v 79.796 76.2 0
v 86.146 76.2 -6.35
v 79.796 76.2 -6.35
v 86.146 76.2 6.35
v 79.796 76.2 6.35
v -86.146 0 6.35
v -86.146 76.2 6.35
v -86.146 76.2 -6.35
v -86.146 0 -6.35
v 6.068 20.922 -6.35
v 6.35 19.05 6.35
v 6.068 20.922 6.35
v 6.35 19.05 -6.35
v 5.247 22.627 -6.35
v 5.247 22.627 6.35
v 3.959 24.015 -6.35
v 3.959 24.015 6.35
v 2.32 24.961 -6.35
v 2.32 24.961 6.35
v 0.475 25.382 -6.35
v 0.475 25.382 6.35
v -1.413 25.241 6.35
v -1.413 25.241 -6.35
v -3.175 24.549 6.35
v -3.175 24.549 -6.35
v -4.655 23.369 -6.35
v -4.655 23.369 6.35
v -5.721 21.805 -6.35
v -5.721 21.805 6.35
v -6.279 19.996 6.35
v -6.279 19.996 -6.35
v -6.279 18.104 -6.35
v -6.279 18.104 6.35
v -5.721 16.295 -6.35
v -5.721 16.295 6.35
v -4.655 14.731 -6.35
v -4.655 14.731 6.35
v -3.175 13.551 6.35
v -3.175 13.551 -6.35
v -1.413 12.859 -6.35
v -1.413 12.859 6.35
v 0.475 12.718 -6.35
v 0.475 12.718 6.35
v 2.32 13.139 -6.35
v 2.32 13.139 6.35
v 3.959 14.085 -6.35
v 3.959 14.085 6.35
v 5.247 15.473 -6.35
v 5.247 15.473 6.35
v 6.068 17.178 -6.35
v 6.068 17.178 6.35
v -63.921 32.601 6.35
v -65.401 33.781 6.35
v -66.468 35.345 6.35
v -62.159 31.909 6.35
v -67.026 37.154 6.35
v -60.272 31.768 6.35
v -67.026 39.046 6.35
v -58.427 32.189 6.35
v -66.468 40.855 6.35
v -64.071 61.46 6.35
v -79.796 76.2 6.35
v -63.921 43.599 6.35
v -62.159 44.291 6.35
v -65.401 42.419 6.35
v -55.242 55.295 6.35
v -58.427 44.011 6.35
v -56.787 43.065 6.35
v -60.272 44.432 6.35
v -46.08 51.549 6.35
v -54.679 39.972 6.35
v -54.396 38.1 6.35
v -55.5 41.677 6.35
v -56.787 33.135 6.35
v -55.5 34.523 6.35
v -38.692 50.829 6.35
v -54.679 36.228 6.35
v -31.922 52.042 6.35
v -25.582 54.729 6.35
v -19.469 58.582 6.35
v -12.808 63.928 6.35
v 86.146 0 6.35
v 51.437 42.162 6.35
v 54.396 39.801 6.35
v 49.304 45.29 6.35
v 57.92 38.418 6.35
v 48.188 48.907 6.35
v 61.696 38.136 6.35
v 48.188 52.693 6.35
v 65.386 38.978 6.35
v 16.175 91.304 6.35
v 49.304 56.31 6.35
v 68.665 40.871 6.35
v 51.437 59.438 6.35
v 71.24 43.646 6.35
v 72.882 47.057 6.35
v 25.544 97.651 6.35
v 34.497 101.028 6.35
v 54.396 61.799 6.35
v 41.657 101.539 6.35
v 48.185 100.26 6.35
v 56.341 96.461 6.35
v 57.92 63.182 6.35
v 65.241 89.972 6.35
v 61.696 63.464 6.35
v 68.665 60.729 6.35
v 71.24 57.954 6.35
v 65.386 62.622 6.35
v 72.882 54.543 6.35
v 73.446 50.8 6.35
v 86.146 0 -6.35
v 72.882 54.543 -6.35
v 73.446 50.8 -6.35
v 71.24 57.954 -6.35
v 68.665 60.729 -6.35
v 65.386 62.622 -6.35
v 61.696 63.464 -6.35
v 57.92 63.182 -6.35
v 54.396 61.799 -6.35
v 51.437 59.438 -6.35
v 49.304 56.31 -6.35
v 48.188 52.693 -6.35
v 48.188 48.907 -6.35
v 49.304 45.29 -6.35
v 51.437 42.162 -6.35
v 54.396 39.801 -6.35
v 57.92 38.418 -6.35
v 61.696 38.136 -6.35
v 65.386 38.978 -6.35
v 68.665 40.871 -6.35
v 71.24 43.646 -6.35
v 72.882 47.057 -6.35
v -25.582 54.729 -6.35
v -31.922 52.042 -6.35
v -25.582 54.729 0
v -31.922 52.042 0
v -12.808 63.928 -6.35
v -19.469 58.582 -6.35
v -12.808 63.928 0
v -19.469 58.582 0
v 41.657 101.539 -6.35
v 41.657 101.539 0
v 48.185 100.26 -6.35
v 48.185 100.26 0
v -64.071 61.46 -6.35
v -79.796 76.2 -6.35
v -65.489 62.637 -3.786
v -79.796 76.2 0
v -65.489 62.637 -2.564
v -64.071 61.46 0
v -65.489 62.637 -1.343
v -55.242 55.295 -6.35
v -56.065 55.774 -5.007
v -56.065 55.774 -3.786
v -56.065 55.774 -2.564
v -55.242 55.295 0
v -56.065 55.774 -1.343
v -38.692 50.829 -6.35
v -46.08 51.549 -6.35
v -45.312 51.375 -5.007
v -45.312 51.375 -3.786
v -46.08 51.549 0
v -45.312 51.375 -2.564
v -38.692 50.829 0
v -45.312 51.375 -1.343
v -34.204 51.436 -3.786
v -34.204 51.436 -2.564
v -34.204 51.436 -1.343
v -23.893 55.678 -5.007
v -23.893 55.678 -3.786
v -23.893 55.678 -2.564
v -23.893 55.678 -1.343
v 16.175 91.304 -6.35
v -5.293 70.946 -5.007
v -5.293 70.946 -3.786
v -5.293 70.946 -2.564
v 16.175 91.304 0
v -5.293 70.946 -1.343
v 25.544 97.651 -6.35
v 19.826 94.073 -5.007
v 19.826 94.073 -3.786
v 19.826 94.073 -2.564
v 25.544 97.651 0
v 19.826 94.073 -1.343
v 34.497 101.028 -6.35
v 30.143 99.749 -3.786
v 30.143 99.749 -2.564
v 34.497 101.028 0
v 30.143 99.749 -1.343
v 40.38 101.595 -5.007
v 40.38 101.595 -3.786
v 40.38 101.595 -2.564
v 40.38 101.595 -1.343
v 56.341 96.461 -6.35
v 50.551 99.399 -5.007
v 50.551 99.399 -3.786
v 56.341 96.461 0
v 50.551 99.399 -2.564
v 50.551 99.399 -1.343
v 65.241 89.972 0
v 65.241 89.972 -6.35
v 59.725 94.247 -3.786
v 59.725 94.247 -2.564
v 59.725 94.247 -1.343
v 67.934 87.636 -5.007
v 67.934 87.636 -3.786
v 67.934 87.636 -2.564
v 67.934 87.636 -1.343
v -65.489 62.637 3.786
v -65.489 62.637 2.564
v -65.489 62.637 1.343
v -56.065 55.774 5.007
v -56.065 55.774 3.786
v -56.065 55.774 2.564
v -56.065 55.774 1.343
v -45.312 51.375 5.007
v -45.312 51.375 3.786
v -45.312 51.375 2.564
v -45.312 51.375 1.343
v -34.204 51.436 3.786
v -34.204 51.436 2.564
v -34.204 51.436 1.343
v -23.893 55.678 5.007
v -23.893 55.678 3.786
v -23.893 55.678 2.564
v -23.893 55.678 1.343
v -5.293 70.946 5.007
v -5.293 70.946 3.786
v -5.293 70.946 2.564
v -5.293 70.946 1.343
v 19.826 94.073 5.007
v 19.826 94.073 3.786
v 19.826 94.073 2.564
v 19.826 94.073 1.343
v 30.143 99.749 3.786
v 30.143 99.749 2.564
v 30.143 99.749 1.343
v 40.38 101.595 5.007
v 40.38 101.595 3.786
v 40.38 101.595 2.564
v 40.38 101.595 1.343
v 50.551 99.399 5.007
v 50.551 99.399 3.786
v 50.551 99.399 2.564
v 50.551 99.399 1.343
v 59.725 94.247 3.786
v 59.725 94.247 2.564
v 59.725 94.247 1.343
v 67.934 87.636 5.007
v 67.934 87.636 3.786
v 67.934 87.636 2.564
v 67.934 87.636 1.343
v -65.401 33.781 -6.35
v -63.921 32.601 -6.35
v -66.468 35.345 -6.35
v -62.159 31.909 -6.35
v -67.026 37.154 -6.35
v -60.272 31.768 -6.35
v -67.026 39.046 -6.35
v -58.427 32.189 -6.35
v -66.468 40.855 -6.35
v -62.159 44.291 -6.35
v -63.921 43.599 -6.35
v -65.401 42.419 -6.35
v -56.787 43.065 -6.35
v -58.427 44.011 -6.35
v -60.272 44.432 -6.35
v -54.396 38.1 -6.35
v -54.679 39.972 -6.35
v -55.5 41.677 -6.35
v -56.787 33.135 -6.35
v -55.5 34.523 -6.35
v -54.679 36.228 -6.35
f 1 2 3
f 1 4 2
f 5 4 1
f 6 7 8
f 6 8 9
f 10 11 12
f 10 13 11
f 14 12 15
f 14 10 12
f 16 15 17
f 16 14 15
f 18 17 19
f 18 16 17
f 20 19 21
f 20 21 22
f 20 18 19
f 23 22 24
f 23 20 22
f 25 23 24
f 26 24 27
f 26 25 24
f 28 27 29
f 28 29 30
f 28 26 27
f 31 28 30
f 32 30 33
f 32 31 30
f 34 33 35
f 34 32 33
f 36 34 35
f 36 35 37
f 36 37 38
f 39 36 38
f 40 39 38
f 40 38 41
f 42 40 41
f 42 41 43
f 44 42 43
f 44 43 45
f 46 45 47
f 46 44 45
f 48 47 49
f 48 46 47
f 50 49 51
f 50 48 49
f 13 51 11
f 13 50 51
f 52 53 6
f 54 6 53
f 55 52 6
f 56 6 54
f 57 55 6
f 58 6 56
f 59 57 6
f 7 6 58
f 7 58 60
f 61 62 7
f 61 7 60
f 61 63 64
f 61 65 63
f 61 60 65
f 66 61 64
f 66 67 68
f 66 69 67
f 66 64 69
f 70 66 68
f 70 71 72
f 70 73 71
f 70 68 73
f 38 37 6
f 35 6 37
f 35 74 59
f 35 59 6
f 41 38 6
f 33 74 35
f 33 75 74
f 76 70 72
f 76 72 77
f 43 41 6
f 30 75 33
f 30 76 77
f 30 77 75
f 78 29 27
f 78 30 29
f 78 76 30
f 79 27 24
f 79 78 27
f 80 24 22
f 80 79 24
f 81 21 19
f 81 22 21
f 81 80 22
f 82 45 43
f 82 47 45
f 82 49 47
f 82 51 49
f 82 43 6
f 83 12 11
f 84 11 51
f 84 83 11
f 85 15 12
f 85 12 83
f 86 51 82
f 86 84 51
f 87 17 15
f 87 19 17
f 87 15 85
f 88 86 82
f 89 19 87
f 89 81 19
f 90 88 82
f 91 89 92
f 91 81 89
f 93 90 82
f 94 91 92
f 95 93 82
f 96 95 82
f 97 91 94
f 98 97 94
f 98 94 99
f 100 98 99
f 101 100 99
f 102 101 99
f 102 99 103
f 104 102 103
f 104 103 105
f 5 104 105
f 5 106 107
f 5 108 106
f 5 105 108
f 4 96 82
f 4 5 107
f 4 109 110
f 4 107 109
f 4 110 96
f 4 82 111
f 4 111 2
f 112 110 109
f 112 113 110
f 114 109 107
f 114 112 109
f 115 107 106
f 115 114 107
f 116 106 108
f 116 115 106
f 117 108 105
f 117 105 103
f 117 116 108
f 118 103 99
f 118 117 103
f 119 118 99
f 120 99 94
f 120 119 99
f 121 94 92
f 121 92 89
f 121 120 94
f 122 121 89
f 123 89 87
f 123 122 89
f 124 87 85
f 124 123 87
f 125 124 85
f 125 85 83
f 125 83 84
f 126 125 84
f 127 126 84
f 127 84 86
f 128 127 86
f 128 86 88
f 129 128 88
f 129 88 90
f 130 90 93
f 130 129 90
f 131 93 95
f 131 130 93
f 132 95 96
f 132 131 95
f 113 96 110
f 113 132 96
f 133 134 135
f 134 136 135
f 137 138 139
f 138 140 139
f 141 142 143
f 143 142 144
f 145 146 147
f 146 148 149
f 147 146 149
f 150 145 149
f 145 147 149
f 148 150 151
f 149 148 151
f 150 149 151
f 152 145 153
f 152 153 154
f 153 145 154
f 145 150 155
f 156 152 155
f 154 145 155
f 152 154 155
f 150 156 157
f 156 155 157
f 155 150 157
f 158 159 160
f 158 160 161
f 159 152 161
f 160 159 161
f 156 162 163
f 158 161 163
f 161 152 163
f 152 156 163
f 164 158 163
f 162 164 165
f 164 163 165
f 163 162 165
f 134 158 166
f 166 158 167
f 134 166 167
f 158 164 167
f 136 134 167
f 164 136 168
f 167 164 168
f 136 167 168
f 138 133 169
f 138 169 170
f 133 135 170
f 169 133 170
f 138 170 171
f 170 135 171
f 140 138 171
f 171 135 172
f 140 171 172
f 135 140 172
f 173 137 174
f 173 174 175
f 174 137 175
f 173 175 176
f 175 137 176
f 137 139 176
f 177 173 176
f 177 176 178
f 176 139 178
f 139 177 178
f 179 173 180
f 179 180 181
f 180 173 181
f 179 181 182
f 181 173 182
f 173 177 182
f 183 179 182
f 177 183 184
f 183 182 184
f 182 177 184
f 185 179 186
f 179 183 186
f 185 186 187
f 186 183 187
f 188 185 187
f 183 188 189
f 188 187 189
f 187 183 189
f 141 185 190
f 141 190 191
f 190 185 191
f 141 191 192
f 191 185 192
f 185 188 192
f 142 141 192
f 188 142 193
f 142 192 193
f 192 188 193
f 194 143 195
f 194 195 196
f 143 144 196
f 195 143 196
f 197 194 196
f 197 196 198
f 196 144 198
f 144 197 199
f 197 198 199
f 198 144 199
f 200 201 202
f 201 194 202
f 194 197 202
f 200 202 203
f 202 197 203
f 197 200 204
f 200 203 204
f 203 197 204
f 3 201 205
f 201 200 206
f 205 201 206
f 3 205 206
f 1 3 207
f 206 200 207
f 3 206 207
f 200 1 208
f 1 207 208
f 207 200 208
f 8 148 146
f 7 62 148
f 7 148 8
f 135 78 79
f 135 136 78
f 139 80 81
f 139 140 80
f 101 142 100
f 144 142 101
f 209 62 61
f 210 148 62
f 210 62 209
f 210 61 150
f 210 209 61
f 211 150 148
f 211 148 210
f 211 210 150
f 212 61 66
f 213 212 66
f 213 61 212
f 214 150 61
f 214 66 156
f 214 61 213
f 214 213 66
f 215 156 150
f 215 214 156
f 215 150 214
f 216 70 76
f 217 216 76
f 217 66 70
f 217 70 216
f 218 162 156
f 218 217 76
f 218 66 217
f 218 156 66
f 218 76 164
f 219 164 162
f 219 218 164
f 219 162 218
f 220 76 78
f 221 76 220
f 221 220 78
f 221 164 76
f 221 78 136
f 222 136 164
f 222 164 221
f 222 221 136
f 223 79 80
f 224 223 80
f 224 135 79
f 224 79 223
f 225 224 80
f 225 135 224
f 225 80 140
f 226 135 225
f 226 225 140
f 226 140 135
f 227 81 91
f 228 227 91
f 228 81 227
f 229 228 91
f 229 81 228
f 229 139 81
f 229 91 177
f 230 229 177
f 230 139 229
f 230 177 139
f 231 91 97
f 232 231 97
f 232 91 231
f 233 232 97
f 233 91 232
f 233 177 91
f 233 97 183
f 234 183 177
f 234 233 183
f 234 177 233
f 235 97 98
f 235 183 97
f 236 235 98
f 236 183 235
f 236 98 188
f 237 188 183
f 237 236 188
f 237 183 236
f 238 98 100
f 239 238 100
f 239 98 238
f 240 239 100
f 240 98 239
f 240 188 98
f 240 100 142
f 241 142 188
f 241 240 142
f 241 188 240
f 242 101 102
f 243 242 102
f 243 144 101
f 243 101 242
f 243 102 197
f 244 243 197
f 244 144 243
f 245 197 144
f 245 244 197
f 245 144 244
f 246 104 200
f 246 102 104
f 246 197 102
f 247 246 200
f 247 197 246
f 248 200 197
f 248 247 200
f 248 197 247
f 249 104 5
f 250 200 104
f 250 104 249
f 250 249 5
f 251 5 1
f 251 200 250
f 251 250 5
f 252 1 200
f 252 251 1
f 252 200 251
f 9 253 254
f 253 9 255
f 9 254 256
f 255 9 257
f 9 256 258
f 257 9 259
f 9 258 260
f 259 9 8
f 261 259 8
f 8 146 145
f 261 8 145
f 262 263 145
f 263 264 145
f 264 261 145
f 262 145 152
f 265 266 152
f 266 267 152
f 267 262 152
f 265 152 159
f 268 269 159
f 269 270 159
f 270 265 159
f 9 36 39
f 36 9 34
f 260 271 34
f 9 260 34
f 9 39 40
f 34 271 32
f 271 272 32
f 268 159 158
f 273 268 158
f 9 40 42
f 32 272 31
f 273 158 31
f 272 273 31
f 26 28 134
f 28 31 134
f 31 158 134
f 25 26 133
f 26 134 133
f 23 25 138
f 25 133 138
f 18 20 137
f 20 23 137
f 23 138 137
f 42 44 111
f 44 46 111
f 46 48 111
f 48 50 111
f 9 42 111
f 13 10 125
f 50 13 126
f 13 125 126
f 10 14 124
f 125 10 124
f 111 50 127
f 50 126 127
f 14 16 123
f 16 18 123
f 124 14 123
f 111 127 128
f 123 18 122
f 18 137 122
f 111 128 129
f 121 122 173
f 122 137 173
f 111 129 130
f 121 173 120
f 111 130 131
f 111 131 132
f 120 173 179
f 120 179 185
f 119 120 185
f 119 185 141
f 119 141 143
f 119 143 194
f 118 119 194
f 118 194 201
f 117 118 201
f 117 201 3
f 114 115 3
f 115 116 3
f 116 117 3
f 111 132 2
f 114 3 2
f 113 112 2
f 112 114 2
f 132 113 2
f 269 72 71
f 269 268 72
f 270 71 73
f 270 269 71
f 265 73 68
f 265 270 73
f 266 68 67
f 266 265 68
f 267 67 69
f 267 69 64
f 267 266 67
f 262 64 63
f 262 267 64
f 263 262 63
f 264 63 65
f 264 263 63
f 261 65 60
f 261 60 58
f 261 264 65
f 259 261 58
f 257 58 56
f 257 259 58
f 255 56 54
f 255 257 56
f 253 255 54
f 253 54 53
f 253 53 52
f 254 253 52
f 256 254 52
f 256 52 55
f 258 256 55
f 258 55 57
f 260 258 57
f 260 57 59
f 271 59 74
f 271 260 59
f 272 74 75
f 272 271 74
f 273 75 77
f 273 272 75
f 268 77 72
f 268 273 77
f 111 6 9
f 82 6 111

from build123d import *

# Parameters (mm, degrees)
SKETCH1_R           = 6.35
SKETCH1_R_2         = 12.7
BOSS_EXTRUDE1_DEPTH = 6.35


with BuildPart() as part:
    # Sketch1 → Boss-Extrude1 (new body, symmetric)
    with BuildSketch(Plane.XY):
        with BuildLine():
            Line((-79.796453401, 76.2), (-86.146453401, 76.2))
            Line((-86.146453401, 76.2), (-86.146453401, 0))
            Line((-86.146453401, 0), (86.146453401, 0))
            Line((86.146453401, 0), (86.146453401, 76.2))
            Line((86.146453401, 76.2), (79.796453401, 76.2))
            add(Edge.make_bspline(
                [(-79.796453401, 76.2), (-79.189310673, 75.592857272), (-78.419838536, 74.823385314), (-76.839857821, 73.246390226), (-75.851003836, 72.270543834), (-75.034699193, 71.465022368), (-74.31136546, 70.756453846), (-73.576023602, 70.040507975), (-72.649051158, 69.144399927), (-71.532310925, 68.076646001), (-70.219545888, 66.841538959), (-68.485500153, 65.247913117), (-66.807716386, 63.756647213), (-65.185312119, 62.36911953), (-63.618958787, 61.086526883), (-62.34769091, 60.083038976), (-60.733687689, 58.860738712), (-58.999907039, 57.626741231), (-57.13486754, 56.400446885), (-54.689758355, 54.949353195), (-51.661408432, 53.383106741), (-47.681394209, 51.79858192), (-42.756225748, 50.724835978), (-37.483967518, 50.69738214), (-31.963227666, 51.800126692), (-26.958939092, 53.839759909), (-22.374127361, 56.485511101), (-17.5554774, 59.905980771), (-12.89982765, 63.745892876), (-7.93842501, 68.317451576), (-2.627479816, 73.554045081), (2.627480982, 78.845954257), (7.938421068, 84.082550661), (12.899835071, 88.654102914), (17.555465978, 92.49402571), (22.374144001, 95.914479457), (26.958910268, 98.560256445), (31.963269254, 100.599849723), (37.483906393, 101.702652489), (42.756336754, 101.675101345), (47.681204664, 100.601524117), (52.135278168, 98.828187823), (55.851003112, 96.824403503), (58.927126504, 94.848359807), (61.716390424, 92.827512958), (64.26102906, 90.813749271), (66.893187543, 88.584227753), (69.259901401, 86.454968432), (71.335322871, 84.51629968), (73.226893933, 82.7004825), (74.640561752, 81.324965424), (76.227601829, 79.75884352), (77.4656073, 78.52965168), (78.875222889, 77.121230608), (79.492882037, 76.503571364), (79.796453401, 76.2)],
                knots=[0.083220032, 0.083220032, 0.083220032, 0.083220032, 0.083220032, 0.100917711, 0.105342131, 0.10976655, 0.11419097, 0.11861539, 0.123039809, 0.127464229, 0.136313069, 0.145161908, 0.154010747, 0.167923193, 0.174879415, 0.181835638, 0.18879186, 0.195748083, 0.209660528, 0.218392384, 0.22712424, 0.244587953, 0.268184956, 0.29178156, 0.313137051, 0.334492665, 0.364357185, 0.384128158, 0.403899131, 0.435932731, 0.467966332, 0.5, 0.532033668, 0.564067269, 0.596100869, 0.615871842, 0.635642815, 0.665507335, 0.686862949, 0.70821844, 0.731815044, 0.755412047, 0.77287576, 0.790339472, 0.804251917, 0.818164362, 0.832076807, 0.845989253, 0.863686931, 0.872535771, 0.88138461, 0.89023345, 0.899082289, 0.907931129, 0.916779968, 0.916779968, 0.916779968, 0.916779968, 0.916779968], degree=4))
        make_face()
        with Locations((-60.746453401, 38.1)):
            Circle(SKETCH1_R, mode=Mode.SUBTRACT)
        with Locations((0, 19.05)):
            Circle(SKETCH1_R, mode=Mode.SUBTRACT)
        with Locations((60.746453401, 50.8)):
            Circle(SKETCH1_R_2, mode=Mode.SUBTRACT)
    extrude(amount=BOSS_EXTRUDE1_DEPTH, both=True)


solid = part.part
